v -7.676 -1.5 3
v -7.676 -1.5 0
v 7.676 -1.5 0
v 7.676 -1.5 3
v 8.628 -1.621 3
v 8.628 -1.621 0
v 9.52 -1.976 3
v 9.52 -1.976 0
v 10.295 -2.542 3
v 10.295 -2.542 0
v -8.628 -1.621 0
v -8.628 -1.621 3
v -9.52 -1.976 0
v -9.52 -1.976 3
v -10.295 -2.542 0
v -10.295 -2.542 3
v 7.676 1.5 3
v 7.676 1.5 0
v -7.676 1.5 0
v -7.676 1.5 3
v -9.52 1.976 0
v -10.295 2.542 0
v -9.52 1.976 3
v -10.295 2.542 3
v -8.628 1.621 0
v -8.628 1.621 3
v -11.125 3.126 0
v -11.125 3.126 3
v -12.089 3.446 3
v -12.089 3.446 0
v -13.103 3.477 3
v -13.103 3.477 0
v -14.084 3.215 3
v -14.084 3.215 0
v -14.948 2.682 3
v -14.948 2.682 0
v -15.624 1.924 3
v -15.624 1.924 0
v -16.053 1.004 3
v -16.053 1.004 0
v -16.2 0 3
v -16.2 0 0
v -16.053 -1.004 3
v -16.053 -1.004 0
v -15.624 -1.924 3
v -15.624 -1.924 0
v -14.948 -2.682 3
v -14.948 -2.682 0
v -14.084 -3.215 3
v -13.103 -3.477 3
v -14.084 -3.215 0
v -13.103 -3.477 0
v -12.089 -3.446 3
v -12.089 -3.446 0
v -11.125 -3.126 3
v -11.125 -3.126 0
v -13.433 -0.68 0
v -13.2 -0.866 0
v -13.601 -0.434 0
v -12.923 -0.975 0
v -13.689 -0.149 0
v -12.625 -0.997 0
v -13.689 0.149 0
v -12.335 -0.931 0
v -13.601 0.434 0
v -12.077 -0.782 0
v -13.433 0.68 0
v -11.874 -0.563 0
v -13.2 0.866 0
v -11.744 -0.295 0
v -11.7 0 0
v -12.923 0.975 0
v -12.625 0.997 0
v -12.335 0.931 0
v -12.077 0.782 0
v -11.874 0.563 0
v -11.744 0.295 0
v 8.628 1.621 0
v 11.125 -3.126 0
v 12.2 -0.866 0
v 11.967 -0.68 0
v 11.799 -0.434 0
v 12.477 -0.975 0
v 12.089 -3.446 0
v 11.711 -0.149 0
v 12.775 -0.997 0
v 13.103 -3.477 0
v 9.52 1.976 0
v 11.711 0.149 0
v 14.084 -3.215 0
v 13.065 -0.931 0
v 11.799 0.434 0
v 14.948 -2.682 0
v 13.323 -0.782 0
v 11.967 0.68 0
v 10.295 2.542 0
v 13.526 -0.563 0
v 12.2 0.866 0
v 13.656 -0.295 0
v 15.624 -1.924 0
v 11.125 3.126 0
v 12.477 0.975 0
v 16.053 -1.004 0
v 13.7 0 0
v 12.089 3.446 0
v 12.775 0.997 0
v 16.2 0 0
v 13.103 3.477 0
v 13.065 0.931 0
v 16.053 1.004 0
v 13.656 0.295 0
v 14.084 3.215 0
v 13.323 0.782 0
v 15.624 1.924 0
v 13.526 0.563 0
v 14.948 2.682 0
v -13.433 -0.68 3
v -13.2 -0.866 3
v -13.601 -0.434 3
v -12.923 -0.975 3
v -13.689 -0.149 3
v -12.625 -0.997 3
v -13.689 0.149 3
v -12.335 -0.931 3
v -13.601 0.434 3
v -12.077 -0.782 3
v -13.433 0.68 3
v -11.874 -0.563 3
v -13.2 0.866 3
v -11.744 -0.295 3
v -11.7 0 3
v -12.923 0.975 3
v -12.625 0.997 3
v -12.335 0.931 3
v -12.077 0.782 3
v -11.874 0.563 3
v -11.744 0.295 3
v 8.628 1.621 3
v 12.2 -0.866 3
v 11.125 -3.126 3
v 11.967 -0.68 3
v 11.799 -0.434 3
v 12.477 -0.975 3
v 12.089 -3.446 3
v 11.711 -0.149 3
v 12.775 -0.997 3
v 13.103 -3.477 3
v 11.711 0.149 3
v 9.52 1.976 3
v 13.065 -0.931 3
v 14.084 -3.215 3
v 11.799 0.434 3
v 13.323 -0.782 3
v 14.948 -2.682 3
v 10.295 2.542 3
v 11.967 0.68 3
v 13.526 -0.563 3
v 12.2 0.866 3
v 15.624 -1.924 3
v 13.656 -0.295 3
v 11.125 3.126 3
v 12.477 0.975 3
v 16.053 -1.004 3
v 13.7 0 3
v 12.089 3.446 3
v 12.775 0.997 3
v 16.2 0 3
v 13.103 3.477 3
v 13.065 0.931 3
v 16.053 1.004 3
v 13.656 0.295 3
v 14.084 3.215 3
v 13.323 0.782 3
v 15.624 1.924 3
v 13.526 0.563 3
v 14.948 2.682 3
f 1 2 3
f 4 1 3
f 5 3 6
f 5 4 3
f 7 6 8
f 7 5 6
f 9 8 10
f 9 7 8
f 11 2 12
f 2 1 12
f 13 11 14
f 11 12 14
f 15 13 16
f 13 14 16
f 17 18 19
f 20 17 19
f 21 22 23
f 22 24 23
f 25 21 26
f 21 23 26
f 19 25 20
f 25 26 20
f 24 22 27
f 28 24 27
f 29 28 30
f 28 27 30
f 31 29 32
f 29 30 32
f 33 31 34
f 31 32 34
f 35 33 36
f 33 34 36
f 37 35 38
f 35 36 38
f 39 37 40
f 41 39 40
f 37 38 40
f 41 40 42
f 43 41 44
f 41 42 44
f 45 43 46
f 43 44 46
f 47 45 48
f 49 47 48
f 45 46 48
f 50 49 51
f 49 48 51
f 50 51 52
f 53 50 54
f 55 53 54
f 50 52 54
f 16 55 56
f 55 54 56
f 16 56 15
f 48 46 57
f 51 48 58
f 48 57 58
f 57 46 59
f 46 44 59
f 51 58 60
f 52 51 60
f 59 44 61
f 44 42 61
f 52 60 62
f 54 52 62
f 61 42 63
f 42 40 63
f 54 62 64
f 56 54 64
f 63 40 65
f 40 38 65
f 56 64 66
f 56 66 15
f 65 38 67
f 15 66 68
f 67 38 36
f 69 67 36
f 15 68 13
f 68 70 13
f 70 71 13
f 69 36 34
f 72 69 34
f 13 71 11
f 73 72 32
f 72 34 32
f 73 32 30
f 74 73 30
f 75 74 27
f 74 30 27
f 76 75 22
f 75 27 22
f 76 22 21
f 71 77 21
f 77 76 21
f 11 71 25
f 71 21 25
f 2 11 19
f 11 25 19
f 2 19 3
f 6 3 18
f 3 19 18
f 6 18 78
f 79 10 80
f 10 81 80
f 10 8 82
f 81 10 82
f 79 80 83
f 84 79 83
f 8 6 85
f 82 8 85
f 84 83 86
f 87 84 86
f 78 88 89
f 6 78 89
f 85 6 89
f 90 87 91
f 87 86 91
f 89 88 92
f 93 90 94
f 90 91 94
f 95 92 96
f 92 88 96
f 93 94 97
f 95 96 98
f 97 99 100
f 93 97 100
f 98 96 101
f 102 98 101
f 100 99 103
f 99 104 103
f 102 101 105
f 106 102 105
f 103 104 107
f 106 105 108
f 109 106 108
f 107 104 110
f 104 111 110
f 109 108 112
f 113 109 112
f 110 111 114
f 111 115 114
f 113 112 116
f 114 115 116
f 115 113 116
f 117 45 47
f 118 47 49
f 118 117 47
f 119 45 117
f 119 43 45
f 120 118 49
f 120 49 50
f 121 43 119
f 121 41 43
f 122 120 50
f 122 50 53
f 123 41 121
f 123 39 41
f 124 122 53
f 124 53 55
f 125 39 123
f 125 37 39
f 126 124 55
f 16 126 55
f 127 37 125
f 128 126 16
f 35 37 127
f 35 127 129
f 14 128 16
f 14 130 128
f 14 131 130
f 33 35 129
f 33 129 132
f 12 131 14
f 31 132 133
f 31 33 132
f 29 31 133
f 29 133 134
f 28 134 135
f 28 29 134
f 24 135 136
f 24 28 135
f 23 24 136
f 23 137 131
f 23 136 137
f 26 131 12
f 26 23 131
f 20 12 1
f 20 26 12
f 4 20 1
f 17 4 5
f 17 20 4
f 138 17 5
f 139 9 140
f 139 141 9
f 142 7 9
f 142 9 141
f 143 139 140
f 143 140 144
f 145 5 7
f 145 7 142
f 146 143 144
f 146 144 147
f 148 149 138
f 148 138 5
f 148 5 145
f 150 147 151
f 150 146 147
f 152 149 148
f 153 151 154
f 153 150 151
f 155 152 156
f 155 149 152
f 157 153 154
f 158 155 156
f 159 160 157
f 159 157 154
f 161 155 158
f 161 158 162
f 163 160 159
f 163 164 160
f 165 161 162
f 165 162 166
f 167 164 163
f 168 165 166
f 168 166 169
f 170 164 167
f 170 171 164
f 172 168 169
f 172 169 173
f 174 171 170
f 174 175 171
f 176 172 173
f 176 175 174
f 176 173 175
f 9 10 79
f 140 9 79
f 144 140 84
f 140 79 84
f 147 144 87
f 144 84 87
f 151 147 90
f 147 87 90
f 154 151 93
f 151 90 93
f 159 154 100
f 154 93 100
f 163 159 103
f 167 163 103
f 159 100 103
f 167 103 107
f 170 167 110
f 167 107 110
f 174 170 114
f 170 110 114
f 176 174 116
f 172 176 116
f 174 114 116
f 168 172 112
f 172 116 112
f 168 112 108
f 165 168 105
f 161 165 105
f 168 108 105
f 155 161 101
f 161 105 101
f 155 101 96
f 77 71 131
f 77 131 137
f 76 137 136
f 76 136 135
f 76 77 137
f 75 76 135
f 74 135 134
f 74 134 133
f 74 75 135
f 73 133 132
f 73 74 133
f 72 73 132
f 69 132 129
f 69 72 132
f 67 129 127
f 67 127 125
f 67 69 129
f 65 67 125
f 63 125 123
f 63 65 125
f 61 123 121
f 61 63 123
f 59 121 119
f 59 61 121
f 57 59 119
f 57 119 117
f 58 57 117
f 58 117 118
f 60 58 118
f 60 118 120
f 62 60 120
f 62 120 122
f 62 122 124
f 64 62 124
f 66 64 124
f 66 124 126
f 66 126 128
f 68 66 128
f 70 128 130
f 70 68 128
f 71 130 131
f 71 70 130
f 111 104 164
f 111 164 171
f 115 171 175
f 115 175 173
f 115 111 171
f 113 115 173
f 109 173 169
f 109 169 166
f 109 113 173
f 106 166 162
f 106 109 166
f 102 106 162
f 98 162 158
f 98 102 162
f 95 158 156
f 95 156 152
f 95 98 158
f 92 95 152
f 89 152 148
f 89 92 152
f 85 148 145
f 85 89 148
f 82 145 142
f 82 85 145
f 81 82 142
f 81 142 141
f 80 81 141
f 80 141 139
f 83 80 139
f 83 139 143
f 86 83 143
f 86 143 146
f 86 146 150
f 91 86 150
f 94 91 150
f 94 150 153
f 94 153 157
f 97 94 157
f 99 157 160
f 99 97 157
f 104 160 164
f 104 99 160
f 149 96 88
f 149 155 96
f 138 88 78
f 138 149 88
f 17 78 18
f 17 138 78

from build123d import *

# Parameters (mm, degrees)
SKETCH_1_R      = 1
EXTRUDE_1_DEPTH = 3
FILLET_1_R      = 3.81


with BuildPart() as part:
    # 스케치1 → 보스-돌출1 (new body)
    with BuildSketch(Plane.XY):
        with BuildLine():
            Line((-9.53772234, -1.5), (9.53772234, -1.5))
            ThreePointArc((9.53772234, -1.5), (16.2, 0), (9.53772234, 1.5))
            Line((9.53772234, 1.5), (-9.53772234, 1.5))
            ThreePointArc((-9.53772234, 1.5), (-16.2, 0), (-9.53772234, -1.5))
        make_face()
        with Locations((-12.7, 0)):
            Circle(SKETCH_1_R, mode=Mode.SUBTRACT)
        with Locations((12.7, 0)):
            Circle(SKETCH_1_R, mode=Mode.SUBTRACT)
    extrude(amount=EXTRUDE_1_DEPTH)

    # 필렛1
    fillet_1_edges = [part.edges().sort_by_distance(p)[0] for p in [
        (9.53772234, -1.5, 1.5),
        (-9.53772234, -1.5, 1.5),
        (-9.53772234, 1.5, 1.5),
        (9.53772234, 1.5, 1.5),
    ]]
    fillet(fillet_1_edges, radius=FILLET_1_R)


solid = part.part
